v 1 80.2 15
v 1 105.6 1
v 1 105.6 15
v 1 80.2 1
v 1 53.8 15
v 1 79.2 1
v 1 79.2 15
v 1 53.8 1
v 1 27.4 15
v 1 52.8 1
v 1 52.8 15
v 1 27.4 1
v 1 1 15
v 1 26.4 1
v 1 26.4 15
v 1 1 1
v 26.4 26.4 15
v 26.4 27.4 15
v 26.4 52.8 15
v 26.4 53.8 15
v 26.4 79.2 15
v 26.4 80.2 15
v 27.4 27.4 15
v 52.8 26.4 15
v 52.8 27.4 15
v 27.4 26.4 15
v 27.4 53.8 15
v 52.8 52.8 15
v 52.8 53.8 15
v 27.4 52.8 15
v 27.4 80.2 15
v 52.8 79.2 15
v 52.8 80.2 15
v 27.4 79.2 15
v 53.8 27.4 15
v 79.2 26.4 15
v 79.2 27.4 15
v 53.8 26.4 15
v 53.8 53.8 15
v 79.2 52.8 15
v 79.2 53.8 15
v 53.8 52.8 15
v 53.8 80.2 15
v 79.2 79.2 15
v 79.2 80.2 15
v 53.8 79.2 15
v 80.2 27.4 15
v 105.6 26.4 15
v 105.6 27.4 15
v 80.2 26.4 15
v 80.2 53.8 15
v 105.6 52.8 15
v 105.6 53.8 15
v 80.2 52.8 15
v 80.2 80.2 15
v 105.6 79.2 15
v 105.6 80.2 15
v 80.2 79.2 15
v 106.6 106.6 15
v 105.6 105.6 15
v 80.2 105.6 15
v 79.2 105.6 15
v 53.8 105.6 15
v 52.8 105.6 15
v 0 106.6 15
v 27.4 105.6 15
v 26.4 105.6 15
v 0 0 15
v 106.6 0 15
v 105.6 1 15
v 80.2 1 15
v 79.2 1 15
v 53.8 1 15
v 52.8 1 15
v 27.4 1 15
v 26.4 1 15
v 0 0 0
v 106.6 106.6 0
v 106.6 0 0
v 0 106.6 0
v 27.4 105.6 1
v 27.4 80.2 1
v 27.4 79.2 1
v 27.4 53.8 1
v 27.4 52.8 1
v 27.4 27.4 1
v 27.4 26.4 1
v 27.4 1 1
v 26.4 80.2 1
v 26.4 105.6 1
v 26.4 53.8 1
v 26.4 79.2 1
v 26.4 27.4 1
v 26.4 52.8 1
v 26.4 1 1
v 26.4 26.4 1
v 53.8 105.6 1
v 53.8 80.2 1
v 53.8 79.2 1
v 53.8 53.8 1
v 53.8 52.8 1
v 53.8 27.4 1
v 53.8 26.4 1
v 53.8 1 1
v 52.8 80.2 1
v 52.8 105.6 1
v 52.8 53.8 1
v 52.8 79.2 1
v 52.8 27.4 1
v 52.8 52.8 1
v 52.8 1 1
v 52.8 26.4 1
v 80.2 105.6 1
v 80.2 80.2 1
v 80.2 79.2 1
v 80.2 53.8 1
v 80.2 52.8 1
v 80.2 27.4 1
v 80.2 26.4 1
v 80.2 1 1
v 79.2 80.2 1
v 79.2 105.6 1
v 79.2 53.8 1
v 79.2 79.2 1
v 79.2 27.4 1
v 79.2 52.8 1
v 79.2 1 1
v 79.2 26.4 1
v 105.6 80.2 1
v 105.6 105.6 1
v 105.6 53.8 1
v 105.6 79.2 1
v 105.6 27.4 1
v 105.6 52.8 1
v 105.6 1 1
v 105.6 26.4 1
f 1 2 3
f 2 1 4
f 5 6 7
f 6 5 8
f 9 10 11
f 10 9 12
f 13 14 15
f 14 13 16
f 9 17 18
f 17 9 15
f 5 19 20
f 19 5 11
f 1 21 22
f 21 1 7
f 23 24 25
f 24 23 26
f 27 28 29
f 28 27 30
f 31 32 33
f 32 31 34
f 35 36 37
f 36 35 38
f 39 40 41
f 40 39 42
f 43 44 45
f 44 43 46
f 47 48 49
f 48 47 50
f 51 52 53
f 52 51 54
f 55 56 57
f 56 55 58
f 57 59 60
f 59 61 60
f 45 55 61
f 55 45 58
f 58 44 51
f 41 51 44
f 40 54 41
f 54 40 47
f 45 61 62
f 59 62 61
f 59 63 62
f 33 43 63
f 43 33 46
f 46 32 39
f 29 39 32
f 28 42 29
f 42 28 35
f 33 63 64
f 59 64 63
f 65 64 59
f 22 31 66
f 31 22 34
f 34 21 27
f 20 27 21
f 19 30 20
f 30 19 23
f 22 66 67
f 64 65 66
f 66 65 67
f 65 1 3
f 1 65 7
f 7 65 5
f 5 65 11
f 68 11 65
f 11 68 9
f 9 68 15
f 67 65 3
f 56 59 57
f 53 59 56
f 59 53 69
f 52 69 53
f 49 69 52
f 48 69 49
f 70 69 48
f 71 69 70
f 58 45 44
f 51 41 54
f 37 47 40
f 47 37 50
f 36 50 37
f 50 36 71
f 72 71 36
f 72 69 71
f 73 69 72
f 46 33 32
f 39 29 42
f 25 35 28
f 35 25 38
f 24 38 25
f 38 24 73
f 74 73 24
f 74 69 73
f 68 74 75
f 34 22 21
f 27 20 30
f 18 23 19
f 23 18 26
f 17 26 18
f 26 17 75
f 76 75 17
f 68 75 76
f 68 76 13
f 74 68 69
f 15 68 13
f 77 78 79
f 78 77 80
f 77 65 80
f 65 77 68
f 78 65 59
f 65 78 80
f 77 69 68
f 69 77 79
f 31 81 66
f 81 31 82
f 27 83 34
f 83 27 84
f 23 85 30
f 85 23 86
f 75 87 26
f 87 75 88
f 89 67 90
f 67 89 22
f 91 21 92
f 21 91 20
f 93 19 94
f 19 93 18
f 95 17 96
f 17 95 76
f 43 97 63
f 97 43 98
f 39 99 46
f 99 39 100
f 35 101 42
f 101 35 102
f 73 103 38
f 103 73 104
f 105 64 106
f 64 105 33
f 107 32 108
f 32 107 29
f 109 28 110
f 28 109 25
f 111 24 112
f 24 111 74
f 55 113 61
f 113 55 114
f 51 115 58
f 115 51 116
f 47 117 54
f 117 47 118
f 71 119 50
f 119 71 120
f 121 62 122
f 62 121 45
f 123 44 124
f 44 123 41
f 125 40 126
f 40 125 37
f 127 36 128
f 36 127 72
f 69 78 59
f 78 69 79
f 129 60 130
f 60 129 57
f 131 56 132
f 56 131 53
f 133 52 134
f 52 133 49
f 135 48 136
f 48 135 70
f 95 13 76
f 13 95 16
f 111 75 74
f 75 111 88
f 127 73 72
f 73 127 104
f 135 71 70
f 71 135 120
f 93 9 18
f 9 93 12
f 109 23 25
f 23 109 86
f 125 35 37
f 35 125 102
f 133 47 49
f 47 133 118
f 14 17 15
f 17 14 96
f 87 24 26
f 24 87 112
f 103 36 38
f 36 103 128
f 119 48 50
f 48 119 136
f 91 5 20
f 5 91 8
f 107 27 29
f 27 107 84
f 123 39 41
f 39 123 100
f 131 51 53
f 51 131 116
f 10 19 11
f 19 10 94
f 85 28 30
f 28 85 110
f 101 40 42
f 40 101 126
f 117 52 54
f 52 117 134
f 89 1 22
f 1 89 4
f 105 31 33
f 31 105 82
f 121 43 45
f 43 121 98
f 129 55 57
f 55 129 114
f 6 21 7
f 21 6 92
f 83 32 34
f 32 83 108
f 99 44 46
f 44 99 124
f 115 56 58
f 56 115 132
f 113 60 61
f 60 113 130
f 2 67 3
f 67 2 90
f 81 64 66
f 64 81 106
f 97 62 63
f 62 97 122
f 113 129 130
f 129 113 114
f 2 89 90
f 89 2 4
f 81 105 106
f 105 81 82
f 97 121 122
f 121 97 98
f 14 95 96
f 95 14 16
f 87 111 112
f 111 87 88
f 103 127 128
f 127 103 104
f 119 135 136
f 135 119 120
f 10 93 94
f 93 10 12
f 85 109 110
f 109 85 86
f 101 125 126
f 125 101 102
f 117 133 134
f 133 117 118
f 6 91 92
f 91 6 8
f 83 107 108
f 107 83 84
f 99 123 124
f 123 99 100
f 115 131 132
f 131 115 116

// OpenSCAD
// The number cell to A side
Grid_A = 4;

// The number cell to B side
Grid_B = 4;

// The wall heigth
Grid_heigth = 15;

// The size of the paint bottle
Bottle_size = 25.4;

// Brush holder
Brush = 0; // [1:Yes, 0:No]

// Brush holder wall heigth
Brush_wall =60;


cube([Grid_A*(1+Bottle_size),Grid_B*(Bottle_size+1),1]);
for(i=[0:1:Grid_A]){
    translate([(Bottle_size+1)*i,0,0])cube([1,Grid_B*(Bottle_size+1)+1,Grid_heigth]);
}
for(i=[0:1:Grid_B]){
    translate([0,(Bottle_size+1)*i,0])cube([Grid_A*(Bottle_size+1)+1,1,Grid_heigth]);
}
if(Brush){
    for(i=[0:1:Grid_A]){
        translate([(Bottle_size+1)*i,-(Bottle_size+1),0])cube([1,(Bottle_size+1)+1,Brush_wall]);
    }
    for(i=[0:1:1]){
        translate([0,-(Bottle_size+1)*i,0])cube([Grid_A*(Bottle_size+1)+1,1,Brush_wall]);
    }
    translate([0,-(Bottle_size+1),0])cube([Grid_A*(1+Bottle_size),(Bottle_size+1),1]);
}
